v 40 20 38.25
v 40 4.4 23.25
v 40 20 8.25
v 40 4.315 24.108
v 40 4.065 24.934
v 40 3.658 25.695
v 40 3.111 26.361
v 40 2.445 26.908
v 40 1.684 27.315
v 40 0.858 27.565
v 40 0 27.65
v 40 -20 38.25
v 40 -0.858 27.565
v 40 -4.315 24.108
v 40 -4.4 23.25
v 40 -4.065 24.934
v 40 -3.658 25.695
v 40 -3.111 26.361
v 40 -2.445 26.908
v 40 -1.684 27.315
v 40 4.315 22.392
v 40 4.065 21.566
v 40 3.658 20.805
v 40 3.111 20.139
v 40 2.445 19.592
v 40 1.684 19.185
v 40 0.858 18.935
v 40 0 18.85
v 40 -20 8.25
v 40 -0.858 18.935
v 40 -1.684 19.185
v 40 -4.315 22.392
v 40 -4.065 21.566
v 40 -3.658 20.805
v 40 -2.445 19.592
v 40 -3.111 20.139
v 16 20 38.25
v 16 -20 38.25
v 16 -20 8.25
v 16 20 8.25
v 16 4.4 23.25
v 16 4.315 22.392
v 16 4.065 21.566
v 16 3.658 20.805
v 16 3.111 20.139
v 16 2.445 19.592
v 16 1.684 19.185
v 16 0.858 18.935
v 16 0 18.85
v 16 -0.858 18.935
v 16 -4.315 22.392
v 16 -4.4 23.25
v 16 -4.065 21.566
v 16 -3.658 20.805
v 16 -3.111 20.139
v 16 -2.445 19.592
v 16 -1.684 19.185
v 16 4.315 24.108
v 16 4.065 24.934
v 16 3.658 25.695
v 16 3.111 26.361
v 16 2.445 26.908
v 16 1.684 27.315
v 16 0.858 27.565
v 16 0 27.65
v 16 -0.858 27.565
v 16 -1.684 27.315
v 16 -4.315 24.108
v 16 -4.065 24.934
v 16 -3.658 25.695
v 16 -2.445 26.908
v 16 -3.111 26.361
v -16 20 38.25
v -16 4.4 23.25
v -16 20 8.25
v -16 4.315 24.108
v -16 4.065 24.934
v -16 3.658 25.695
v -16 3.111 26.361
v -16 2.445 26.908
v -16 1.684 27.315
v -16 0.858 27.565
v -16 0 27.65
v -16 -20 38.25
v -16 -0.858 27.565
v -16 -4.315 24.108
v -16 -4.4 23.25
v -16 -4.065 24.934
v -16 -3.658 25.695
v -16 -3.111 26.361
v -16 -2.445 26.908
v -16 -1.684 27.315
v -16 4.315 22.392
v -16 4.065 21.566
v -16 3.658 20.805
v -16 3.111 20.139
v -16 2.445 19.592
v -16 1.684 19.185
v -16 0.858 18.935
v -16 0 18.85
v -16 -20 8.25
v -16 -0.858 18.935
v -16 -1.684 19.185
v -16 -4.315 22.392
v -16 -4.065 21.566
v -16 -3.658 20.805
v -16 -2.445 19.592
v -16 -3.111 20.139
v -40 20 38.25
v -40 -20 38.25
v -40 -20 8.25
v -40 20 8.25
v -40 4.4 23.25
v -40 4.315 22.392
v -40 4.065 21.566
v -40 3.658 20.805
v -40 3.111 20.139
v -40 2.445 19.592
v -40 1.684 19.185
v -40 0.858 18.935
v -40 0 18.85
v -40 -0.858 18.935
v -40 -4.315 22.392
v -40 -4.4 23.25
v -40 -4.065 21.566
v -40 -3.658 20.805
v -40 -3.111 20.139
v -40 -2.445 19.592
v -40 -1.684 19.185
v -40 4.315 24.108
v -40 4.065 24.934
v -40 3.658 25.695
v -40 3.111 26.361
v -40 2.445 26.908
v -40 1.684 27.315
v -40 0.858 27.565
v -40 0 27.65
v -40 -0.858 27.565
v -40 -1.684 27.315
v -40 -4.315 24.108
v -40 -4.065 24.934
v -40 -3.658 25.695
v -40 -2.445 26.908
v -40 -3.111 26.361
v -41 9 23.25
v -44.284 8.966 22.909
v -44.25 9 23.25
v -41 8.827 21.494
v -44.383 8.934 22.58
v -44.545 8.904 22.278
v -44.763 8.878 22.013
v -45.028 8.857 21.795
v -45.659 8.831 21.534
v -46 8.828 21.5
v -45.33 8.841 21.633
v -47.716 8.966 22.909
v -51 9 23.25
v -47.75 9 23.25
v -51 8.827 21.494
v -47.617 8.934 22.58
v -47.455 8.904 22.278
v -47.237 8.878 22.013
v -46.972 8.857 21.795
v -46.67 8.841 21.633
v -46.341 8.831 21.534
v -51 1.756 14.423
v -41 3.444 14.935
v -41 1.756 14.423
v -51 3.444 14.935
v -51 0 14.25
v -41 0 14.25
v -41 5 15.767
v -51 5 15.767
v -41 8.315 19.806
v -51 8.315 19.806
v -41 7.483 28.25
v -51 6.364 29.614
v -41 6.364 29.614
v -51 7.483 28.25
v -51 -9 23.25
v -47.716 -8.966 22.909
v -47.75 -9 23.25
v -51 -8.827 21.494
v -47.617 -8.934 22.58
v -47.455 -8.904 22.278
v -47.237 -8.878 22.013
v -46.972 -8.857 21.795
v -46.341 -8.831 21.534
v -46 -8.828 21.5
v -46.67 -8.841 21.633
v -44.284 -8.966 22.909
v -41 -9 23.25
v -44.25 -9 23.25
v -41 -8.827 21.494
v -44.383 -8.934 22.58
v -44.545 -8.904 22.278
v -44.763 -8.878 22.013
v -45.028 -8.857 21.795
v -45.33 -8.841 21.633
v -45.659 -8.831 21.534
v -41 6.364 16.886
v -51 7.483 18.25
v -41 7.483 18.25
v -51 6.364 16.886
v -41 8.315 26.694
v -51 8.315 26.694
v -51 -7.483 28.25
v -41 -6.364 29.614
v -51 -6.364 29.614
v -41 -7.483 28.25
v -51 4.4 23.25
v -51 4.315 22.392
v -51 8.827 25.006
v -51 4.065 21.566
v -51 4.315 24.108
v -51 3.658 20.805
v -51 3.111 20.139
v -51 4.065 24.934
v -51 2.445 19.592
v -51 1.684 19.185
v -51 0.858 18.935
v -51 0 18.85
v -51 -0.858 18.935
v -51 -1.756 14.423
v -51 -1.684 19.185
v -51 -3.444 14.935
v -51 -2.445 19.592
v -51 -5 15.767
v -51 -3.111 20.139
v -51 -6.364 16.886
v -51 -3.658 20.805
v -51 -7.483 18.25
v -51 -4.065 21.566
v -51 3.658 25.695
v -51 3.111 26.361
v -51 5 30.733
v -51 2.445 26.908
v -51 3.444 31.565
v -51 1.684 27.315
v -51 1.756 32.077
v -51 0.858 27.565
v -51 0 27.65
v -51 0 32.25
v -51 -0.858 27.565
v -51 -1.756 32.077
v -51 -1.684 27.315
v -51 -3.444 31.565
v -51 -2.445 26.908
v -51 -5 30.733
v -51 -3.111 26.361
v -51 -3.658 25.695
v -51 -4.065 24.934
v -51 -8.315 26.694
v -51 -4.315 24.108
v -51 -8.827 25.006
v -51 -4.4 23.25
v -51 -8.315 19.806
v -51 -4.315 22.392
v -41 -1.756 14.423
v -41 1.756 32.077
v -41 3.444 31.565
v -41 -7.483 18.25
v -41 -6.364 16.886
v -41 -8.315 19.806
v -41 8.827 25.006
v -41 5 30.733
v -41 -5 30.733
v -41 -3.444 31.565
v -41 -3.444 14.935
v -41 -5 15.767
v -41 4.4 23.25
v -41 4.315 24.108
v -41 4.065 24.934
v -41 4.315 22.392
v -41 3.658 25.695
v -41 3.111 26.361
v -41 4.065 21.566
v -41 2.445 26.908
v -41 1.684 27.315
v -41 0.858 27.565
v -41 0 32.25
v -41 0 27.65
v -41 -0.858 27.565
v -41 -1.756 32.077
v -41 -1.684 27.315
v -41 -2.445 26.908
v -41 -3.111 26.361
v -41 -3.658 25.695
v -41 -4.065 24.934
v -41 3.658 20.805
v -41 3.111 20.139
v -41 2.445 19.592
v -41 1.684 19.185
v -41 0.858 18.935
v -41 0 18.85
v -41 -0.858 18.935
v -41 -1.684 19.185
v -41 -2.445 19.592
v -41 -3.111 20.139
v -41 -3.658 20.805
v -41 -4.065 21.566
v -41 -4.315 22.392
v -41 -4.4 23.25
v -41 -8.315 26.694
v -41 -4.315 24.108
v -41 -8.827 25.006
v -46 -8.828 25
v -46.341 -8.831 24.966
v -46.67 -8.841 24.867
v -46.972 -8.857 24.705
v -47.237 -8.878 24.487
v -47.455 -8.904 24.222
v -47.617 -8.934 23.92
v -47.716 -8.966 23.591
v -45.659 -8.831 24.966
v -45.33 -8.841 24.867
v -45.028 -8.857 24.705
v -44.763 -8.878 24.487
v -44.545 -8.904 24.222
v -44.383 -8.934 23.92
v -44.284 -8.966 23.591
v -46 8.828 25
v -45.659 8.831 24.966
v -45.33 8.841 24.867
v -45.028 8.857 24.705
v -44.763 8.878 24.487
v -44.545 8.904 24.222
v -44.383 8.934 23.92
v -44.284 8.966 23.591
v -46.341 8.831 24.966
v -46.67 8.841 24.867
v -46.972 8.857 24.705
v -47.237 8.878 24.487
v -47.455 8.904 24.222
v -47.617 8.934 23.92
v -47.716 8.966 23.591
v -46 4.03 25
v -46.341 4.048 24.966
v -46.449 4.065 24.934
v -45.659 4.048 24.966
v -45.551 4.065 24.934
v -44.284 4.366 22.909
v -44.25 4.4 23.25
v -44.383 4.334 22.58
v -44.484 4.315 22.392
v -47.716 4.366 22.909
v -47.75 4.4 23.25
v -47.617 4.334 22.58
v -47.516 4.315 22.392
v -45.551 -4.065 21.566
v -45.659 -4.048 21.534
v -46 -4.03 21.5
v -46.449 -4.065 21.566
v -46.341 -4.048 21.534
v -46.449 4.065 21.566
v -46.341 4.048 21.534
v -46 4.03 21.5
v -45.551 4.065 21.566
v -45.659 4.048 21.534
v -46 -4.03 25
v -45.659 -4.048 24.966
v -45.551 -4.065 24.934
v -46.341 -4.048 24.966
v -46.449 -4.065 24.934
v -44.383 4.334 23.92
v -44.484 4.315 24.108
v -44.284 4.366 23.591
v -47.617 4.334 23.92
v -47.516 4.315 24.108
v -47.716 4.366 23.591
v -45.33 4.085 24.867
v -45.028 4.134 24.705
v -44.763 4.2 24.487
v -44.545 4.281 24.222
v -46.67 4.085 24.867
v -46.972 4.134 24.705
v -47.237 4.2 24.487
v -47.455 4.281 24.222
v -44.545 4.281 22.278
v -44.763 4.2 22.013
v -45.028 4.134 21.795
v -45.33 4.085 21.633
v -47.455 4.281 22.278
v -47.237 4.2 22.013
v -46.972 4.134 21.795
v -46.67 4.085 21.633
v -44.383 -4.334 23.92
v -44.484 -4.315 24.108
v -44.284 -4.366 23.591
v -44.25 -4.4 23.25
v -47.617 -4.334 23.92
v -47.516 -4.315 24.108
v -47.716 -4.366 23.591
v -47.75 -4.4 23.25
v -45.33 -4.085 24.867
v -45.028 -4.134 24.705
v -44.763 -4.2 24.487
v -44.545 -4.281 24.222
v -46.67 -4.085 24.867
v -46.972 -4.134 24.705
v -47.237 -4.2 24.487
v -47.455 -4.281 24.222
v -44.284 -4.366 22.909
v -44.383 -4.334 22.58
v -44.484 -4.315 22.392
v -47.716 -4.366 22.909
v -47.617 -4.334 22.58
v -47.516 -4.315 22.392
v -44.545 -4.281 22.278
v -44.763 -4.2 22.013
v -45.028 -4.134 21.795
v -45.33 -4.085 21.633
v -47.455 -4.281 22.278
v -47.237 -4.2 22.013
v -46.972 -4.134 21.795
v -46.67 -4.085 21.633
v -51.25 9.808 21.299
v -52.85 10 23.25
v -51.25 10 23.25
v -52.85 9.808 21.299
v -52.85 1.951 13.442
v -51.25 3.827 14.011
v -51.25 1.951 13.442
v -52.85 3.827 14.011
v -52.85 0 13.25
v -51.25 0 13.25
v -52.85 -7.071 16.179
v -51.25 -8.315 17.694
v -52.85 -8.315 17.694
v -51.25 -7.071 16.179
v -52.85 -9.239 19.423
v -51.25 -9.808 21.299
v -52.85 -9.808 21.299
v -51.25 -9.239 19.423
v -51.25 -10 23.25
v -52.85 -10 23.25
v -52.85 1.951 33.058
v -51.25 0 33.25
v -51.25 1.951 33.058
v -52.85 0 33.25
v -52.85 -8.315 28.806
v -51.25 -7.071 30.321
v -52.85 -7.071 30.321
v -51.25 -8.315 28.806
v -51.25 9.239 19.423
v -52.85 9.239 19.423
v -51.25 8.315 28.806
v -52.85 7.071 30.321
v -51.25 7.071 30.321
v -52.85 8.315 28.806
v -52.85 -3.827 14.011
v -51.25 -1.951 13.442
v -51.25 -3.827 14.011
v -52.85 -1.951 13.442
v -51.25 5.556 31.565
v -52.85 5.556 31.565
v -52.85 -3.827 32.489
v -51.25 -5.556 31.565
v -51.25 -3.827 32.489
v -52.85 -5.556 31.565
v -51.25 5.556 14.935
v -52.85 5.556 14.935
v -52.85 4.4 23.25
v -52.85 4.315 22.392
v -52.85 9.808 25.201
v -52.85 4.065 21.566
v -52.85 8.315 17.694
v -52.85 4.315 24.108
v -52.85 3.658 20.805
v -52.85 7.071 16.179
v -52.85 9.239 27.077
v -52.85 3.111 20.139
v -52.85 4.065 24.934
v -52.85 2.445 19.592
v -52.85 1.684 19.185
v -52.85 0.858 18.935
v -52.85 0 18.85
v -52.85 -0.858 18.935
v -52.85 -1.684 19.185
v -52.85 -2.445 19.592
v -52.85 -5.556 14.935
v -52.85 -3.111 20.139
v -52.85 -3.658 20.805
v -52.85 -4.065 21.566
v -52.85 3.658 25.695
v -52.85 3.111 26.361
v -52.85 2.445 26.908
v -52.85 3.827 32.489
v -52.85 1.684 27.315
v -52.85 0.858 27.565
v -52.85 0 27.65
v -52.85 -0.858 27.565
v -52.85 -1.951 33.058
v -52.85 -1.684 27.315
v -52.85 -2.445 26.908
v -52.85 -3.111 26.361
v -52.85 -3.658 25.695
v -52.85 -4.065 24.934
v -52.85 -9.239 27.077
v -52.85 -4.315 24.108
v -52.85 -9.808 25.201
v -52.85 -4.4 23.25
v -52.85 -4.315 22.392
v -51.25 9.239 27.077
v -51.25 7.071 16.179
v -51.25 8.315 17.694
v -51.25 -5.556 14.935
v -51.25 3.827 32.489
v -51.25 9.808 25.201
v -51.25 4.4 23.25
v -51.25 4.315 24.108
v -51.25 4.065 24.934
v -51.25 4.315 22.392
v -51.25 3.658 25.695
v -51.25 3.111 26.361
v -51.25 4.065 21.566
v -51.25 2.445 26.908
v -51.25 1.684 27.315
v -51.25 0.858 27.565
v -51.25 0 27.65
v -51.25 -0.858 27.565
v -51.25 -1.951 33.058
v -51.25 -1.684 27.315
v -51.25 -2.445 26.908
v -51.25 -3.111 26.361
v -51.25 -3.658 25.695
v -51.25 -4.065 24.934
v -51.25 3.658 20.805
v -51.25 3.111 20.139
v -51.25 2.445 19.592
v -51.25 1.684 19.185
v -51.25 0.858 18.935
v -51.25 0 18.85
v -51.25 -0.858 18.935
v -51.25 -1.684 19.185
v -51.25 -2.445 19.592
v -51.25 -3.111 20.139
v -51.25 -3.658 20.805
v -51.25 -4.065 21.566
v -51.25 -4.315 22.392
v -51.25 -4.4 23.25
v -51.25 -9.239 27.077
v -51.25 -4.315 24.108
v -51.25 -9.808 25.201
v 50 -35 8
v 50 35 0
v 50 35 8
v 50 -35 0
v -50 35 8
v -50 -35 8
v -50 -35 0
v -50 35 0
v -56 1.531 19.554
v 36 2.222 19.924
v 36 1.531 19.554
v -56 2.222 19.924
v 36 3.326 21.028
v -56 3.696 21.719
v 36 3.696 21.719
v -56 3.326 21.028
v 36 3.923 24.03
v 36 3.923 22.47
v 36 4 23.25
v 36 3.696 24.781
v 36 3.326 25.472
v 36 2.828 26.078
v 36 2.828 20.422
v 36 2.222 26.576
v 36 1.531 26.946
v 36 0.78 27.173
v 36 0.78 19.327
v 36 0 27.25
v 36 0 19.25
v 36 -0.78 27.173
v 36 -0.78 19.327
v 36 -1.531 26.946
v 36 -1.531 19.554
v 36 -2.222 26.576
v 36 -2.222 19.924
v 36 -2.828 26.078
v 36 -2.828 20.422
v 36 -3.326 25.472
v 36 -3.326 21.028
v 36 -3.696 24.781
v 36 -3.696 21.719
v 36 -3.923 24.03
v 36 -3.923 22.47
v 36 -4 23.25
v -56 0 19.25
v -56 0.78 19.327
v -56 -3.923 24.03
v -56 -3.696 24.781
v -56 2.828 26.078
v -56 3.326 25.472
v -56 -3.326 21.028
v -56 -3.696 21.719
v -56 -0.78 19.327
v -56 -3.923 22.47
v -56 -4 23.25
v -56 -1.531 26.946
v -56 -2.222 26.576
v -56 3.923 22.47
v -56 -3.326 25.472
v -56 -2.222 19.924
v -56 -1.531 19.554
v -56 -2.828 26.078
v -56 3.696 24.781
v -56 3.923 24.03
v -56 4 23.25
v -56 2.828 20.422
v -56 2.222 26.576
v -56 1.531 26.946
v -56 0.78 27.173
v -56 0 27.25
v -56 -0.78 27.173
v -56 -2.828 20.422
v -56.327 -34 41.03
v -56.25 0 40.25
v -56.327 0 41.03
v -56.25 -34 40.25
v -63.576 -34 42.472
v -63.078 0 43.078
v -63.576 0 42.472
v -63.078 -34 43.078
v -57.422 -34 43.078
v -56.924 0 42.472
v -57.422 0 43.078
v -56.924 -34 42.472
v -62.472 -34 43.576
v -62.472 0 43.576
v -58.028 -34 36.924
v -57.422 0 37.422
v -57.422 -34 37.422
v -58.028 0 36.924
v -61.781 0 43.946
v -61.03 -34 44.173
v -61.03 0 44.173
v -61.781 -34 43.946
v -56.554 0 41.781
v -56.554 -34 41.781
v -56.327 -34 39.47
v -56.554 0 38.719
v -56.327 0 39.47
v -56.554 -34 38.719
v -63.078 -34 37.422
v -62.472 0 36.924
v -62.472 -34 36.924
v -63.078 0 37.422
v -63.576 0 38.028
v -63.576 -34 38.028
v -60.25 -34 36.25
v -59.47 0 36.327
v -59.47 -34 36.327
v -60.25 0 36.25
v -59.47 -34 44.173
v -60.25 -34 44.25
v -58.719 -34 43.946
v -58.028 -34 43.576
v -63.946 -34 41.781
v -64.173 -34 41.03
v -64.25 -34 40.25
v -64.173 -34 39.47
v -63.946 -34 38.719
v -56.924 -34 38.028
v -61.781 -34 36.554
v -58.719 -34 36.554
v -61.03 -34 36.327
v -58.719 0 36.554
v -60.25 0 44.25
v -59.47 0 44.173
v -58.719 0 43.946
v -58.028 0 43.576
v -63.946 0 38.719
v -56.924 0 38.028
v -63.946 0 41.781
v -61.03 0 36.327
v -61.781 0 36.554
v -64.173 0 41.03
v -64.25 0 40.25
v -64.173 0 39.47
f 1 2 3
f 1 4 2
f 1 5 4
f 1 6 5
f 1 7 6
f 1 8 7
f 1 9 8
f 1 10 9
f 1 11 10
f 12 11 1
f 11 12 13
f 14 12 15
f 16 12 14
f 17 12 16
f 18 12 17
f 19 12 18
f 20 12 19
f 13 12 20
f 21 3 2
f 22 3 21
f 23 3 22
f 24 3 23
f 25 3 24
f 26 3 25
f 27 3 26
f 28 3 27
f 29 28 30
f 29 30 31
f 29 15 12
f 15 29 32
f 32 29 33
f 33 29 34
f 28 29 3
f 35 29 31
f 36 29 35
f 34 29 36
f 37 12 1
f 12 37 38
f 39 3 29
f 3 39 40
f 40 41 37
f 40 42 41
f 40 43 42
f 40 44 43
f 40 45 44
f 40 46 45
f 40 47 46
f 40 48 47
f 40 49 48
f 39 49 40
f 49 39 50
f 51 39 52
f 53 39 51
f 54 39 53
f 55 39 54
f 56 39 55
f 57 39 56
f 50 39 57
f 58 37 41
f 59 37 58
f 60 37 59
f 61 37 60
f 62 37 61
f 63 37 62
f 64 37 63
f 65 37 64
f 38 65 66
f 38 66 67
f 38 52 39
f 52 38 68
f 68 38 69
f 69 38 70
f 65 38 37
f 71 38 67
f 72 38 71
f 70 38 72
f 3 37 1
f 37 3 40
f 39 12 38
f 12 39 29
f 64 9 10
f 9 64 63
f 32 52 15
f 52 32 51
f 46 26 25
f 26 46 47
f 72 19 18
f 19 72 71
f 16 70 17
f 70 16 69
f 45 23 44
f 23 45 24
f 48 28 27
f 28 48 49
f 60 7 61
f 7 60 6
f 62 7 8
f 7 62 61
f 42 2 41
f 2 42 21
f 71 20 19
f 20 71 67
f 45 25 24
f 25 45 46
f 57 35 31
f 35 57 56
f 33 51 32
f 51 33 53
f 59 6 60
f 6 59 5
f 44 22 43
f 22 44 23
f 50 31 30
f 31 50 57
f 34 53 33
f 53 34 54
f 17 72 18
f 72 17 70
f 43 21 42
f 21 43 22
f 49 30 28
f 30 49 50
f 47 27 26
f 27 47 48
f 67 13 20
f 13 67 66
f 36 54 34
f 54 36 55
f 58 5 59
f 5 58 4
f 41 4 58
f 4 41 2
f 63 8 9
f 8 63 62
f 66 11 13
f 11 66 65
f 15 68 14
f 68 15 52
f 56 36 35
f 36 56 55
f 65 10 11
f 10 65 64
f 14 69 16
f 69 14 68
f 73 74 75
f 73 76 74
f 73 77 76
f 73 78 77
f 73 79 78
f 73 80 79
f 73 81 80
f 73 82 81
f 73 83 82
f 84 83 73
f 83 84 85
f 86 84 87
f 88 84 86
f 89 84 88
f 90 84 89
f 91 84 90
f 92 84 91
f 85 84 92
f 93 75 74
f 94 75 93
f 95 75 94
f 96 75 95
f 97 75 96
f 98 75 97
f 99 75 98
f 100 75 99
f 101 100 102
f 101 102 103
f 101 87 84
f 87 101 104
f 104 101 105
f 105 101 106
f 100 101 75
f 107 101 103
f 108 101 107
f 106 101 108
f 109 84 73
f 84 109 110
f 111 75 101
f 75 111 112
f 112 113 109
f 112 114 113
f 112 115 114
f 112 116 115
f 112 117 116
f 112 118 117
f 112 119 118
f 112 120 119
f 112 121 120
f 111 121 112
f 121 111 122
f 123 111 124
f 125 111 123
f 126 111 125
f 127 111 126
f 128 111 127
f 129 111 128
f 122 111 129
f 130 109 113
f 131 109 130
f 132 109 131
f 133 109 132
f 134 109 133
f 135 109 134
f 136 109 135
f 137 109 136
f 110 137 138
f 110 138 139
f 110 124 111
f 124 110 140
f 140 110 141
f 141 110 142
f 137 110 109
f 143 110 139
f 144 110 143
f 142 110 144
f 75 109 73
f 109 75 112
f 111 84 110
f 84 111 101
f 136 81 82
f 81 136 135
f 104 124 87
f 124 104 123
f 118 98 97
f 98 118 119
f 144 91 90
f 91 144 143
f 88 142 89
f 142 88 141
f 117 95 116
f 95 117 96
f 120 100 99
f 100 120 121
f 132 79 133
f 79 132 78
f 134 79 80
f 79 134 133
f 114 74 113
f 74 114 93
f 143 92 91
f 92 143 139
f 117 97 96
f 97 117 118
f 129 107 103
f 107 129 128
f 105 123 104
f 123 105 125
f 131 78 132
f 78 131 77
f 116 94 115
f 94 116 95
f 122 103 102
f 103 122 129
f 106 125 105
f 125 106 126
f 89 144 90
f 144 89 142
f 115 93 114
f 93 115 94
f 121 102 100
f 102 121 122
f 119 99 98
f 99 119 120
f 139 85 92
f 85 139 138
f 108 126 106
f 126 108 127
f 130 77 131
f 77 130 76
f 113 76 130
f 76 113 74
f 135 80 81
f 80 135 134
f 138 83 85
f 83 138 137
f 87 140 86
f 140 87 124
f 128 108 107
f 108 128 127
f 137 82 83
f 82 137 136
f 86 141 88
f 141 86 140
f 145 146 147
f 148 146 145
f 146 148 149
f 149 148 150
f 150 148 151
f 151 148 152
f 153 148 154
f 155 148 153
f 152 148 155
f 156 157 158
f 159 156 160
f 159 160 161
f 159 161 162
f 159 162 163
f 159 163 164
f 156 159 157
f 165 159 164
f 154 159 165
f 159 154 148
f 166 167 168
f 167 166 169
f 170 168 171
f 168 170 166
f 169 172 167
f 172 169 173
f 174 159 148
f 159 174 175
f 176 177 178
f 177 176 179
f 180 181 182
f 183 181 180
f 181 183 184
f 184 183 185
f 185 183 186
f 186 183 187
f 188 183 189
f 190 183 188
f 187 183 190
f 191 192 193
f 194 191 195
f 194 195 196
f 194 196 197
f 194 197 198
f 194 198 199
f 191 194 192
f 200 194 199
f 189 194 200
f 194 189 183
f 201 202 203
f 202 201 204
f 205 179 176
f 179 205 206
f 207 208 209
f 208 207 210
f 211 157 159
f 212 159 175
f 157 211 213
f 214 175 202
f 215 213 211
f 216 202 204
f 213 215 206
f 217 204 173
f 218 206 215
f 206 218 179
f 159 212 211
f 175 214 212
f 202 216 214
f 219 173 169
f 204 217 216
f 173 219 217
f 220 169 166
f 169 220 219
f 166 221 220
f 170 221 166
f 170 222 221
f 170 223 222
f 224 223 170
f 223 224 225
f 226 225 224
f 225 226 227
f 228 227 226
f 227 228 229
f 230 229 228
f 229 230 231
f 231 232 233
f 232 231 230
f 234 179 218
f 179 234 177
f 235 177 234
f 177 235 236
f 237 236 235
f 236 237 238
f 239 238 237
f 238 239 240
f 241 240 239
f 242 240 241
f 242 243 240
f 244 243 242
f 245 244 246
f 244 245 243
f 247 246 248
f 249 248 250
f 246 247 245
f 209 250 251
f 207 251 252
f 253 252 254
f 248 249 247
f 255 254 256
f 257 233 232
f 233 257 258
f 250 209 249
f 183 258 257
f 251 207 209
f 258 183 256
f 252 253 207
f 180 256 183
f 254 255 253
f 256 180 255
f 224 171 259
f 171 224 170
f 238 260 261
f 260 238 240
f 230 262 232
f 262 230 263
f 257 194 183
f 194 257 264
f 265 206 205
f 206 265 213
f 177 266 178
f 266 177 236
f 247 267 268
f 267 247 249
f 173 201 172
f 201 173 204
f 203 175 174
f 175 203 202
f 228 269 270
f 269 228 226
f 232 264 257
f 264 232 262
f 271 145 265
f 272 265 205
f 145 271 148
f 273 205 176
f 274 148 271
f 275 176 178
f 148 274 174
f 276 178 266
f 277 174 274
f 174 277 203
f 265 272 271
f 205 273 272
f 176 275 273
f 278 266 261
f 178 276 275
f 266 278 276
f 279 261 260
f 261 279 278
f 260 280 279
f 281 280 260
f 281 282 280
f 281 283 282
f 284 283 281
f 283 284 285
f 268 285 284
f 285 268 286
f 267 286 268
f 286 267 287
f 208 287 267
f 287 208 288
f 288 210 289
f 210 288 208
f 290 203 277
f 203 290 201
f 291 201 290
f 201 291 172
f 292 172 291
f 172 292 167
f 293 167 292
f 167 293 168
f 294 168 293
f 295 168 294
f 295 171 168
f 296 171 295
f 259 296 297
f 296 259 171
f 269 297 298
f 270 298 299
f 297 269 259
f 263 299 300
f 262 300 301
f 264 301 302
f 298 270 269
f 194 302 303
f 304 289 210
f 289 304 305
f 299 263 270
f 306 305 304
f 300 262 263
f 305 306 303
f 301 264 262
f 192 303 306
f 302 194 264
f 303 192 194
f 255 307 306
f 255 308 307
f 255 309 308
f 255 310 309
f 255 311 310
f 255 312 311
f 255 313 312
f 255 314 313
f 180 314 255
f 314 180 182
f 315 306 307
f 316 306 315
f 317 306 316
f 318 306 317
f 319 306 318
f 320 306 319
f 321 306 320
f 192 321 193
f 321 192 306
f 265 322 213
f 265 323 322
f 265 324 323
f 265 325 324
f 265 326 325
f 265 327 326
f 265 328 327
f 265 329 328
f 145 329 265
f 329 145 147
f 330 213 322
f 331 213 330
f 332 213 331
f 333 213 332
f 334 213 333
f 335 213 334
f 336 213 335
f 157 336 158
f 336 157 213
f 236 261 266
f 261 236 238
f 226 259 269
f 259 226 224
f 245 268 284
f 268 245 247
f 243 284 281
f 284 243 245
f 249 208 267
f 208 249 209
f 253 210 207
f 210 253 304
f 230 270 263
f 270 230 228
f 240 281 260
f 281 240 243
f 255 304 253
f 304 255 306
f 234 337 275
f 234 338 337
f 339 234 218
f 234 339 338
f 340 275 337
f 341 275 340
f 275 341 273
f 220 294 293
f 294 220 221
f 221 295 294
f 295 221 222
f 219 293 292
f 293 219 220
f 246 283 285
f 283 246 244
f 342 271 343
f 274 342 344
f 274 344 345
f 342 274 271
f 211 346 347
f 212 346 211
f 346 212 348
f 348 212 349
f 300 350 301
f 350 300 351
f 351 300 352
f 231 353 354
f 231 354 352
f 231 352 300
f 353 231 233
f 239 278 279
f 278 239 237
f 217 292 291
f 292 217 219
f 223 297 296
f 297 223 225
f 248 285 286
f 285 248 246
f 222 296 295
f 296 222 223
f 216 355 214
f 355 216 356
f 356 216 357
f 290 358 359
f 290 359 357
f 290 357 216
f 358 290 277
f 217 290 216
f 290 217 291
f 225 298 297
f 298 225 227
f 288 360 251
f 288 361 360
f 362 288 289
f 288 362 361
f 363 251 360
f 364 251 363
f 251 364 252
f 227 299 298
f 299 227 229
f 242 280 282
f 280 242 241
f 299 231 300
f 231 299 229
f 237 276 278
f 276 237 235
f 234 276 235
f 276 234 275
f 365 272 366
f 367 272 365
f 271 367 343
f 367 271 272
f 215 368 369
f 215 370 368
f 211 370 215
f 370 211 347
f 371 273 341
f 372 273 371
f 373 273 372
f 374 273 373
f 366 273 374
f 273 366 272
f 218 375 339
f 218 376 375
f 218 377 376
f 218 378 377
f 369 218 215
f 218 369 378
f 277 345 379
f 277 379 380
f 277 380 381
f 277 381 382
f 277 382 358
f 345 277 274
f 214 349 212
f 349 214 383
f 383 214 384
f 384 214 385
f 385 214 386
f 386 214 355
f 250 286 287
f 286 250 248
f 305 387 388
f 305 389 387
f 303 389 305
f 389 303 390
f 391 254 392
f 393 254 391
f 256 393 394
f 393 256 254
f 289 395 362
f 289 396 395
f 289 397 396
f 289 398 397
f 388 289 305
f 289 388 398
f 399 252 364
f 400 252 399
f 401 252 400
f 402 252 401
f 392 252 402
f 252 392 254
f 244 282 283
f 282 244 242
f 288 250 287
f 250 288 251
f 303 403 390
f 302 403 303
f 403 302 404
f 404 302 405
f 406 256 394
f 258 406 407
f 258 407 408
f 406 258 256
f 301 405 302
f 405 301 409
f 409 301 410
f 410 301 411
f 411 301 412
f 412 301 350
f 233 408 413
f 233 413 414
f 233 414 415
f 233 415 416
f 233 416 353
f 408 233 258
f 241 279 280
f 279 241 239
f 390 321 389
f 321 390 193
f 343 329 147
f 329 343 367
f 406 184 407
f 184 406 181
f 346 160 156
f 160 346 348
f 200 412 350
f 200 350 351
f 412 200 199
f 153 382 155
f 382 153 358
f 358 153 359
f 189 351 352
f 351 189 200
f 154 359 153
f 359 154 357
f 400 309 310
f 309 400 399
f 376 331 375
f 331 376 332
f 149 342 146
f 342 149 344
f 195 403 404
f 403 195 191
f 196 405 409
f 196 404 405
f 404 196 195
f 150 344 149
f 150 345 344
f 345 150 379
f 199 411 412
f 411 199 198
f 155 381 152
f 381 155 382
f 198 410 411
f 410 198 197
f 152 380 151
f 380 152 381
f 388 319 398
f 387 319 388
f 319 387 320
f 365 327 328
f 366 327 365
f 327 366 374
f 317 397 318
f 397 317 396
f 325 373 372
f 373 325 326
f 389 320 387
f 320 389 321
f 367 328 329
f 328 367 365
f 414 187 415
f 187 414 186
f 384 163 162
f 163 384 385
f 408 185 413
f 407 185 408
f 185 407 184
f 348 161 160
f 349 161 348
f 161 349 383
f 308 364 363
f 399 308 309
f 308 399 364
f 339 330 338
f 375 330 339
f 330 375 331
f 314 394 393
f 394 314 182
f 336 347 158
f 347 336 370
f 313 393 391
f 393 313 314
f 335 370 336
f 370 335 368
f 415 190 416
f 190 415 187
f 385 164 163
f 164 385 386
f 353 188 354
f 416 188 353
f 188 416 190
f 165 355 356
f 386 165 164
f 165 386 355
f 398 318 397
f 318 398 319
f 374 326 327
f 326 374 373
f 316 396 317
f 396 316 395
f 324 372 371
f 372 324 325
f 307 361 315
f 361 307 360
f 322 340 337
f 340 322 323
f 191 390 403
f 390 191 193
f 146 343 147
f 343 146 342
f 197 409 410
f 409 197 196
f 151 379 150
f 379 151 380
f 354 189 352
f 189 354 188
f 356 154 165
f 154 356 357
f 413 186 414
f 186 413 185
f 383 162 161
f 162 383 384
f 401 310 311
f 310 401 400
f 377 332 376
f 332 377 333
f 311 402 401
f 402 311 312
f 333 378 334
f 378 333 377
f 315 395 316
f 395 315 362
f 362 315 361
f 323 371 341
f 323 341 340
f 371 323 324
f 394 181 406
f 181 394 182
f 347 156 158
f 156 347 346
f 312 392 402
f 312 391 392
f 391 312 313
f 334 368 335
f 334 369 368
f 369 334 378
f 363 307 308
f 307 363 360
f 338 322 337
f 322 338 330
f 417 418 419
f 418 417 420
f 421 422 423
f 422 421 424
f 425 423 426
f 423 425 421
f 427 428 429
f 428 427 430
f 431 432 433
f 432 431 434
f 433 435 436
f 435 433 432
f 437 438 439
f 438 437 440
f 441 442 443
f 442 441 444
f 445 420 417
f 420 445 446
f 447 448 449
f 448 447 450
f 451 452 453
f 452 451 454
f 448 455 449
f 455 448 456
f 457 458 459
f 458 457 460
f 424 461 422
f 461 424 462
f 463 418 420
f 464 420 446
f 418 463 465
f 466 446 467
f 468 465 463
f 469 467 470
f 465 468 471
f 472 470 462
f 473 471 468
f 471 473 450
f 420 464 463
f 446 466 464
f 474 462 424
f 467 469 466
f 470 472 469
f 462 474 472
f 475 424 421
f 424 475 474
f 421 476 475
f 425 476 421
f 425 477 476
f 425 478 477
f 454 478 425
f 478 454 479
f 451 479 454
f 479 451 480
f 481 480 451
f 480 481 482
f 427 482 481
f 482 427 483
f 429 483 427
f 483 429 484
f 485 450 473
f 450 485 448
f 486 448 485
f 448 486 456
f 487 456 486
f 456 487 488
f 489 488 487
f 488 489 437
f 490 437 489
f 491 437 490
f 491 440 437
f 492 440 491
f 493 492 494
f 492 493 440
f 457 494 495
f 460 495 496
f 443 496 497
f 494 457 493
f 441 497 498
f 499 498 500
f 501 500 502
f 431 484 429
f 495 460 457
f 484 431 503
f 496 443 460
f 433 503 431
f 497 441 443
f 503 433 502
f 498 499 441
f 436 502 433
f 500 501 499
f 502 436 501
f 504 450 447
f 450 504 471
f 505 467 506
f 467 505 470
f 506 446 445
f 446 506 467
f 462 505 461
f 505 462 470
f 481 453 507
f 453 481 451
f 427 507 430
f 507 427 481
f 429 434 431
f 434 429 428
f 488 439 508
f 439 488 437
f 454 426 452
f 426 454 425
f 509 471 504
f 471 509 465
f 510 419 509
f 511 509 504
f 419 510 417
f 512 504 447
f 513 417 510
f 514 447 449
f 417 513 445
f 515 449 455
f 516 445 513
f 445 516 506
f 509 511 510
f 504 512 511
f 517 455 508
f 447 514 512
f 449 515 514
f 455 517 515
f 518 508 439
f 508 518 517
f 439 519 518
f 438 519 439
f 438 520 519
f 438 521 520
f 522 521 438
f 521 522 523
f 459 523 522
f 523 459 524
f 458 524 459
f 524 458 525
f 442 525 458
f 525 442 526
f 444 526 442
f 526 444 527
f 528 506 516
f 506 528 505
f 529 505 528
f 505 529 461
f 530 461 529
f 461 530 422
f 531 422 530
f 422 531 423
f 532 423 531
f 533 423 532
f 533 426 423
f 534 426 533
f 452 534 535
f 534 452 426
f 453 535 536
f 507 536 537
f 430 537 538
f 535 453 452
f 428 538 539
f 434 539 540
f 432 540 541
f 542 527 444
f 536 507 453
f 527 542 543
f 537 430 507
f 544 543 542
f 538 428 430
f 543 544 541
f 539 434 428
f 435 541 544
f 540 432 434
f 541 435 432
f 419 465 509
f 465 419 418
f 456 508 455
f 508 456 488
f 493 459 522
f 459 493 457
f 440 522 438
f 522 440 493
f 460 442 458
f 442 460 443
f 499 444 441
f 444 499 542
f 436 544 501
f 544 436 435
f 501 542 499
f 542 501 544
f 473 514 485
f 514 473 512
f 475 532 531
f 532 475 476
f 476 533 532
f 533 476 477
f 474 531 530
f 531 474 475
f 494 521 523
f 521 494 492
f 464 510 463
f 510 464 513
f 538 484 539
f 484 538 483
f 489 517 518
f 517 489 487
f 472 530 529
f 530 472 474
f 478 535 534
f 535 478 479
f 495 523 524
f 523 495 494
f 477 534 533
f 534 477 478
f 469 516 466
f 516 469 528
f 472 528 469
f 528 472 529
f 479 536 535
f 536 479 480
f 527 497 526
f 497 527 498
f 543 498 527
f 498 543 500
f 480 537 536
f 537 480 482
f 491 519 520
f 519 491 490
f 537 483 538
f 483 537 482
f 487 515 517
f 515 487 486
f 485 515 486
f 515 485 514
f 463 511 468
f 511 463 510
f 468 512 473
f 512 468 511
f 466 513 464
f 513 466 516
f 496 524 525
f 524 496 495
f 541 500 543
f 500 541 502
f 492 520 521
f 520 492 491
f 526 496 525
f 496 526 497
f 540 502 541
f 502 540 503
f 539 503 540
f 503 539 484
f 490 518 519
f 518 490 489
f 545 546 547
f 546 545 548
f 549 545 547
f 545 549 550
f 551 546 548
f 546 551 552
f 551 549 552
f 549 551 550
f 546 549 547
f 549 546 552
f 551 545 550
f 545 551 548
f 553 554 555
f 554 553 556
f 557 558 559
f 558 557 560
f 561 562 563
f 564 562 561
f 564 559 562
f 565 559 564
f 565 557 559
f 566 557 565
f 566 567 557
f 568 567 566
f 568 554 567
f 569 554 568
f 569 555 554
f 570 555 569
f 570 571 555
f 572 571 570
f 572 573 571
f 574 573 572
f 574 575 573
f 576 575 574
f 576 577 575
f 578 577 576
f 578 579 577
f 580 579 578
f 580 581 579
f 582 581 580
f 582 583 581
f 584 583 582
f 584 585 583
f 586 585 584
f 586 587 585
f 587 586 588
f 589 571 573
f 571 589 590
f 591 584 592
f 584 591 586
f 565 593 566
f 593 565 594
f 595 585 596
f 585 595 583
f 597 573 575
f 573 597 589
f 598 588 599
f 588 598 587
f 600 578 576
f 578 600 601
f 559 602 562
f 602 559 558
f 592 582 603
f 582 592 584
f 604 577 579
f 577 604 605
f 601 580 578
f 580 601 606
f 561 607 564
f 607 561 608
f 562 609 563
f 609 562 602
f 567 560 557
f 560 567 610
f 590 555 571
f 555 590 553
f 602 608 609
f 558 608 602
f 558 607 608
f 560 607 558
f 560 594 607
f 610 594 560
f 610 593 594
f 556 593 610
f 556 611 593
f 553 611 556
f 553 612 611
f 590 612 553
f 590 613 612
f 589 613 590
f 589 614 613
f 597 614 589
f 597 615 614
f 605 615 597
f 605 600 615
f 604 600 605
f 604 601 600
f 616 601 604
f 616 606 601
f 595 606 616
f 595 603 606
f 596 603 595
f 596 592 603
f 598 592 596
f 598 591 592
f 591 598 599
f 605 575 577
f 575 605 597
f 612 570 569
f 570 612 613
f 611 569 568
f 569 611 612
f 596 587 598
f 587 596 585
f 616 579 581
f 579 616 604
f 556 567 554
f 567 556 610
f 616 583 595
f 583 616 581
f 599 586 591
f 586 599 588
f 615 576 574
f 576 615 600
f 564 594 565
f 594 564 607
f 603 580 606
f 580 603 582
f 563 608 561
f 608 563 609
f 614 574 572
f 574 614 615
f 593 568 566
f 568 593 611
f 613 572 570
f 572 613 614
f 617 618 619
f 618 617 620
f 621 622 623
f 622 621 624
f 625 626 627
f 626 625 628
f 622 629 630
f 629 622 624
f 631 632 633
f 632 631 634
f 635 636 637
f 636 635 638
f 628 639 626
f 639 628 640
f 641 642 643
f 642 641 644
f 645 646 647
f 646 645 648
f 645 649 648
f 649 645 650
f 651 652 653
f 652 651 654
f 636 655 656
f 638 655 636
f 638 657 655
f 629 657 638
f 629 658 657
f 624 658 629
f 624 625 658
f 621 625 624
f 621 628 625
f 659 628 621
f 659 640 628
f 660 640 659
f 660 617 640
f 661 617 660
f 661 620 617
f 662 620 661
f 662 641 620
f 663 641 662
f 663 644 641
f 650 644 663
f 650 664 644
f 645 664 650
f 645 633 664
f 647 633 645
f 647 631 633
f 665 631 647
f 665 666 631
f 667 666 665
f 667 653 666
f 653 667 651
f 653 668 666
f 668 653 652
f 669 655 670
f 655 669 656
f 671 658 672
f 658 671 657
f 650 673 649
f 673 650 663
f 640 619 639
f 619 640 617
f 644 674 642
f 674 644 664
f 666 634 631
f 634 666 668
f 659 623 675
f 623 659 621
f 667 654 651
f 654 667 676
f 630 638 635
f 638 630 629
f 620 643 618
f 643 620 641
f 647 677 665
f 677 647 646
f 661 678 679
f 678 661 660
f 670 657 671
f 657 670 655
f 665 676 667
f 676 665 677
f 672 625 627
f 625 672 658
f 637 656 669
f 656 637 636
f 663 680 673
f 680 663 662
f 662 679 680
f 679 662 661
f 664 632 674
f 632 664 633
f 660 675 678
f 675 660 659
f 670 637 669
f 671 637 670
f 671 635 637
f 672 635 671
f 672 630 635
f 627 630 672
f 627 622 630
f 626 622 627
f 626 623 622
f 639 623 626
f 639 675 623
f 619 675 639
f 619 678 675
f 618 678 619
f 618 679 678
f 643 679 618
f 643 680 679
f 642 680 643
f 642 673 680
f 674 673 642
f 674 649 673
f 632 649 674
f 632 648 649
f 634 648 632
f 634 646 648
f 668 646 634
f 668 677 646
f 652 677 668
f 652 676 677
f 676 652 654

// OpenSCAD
$fn = 32;

// ------------------------------------------------------------------------
// Machine vise: screw d8, jaws 24 x 30 mm
// Every part is its own module, assembly() places every instance.
// ------------------------------------------------------------------------

// --- part 1 ---
module vise_bed() {
  difference() {
    translate([-50, -35, 0]) cube([100, 70, 8]);
  }
}

// --- part 2 ---
module vise_jaw() {
  difference() {
    translate([-12, -20, 0]) cube([24, 40, 30]);
    translate([0, 0, 15]) rotate([0, 90, 0]) cylinder(h = 26, d = 8.8, center = true);
  }
}

// --- part 3 ---
module vise_screw() {
  translate([0, 0, -46]) cylinder(h = 92, d = 8);
}

// --- part 4 ---
module screw_collar() {
  difference() {
    cylinder(h = 10, d = 18);
    translate([0, 0, -1]) cylinder(h = 12, d = 8.8);
    translate([0, 0, 5]) rotate([90, 0, 0]) cylinder(h = 20, d = 3.5, center = true);
  }
}

// --- part 5 ---
module screw_washer() {
  difference() {
      translate([0, 0, 0]) cylinder(h = 1.6, d = 20);
      translate([0, 0, -1]) cylinder(h = 3.6, d = 8.8);
    }
}

// --- part 6 ---
module vise_handle() {
  cylinder(h = 34, d = 8);
}

// --- assembly ---
module assembly() {
  color([0.80, 0.24, 0.20]) translate([0, 0, 0]) rotate([0, 0, 0]) vise_bed();
  color([0.20, 0.45, 0.75]) translate([28, 0, 8.25]) rotate([0, 0, 0]) vise_jaw();
  color([0.25, 0.62, 0.32]) translate([-28, 0, 8.25]) rotate([0, 0, 0]) vise_jaw();
  color([0.92, 0.70, 0.18]) translate([-10, 0, 23.25]) rotate([0, 90, 0]) vise_screw();
  color([0.58, 0.35, 0.70]) translate([-51, 0, 23.25]) rotate([0, 90, 0]) screw_collar();
  color([0.16, 0.66, 0.66]) translate([-52.85, 0, 23.25]) rotate([0, 90, 0]) screw_washer();
  color([0.85, 0.48, 0.18]) translate([-60.25, 0, 40.25]) rotate([90, 0, 0]) vise_handle();
}

assembly();
